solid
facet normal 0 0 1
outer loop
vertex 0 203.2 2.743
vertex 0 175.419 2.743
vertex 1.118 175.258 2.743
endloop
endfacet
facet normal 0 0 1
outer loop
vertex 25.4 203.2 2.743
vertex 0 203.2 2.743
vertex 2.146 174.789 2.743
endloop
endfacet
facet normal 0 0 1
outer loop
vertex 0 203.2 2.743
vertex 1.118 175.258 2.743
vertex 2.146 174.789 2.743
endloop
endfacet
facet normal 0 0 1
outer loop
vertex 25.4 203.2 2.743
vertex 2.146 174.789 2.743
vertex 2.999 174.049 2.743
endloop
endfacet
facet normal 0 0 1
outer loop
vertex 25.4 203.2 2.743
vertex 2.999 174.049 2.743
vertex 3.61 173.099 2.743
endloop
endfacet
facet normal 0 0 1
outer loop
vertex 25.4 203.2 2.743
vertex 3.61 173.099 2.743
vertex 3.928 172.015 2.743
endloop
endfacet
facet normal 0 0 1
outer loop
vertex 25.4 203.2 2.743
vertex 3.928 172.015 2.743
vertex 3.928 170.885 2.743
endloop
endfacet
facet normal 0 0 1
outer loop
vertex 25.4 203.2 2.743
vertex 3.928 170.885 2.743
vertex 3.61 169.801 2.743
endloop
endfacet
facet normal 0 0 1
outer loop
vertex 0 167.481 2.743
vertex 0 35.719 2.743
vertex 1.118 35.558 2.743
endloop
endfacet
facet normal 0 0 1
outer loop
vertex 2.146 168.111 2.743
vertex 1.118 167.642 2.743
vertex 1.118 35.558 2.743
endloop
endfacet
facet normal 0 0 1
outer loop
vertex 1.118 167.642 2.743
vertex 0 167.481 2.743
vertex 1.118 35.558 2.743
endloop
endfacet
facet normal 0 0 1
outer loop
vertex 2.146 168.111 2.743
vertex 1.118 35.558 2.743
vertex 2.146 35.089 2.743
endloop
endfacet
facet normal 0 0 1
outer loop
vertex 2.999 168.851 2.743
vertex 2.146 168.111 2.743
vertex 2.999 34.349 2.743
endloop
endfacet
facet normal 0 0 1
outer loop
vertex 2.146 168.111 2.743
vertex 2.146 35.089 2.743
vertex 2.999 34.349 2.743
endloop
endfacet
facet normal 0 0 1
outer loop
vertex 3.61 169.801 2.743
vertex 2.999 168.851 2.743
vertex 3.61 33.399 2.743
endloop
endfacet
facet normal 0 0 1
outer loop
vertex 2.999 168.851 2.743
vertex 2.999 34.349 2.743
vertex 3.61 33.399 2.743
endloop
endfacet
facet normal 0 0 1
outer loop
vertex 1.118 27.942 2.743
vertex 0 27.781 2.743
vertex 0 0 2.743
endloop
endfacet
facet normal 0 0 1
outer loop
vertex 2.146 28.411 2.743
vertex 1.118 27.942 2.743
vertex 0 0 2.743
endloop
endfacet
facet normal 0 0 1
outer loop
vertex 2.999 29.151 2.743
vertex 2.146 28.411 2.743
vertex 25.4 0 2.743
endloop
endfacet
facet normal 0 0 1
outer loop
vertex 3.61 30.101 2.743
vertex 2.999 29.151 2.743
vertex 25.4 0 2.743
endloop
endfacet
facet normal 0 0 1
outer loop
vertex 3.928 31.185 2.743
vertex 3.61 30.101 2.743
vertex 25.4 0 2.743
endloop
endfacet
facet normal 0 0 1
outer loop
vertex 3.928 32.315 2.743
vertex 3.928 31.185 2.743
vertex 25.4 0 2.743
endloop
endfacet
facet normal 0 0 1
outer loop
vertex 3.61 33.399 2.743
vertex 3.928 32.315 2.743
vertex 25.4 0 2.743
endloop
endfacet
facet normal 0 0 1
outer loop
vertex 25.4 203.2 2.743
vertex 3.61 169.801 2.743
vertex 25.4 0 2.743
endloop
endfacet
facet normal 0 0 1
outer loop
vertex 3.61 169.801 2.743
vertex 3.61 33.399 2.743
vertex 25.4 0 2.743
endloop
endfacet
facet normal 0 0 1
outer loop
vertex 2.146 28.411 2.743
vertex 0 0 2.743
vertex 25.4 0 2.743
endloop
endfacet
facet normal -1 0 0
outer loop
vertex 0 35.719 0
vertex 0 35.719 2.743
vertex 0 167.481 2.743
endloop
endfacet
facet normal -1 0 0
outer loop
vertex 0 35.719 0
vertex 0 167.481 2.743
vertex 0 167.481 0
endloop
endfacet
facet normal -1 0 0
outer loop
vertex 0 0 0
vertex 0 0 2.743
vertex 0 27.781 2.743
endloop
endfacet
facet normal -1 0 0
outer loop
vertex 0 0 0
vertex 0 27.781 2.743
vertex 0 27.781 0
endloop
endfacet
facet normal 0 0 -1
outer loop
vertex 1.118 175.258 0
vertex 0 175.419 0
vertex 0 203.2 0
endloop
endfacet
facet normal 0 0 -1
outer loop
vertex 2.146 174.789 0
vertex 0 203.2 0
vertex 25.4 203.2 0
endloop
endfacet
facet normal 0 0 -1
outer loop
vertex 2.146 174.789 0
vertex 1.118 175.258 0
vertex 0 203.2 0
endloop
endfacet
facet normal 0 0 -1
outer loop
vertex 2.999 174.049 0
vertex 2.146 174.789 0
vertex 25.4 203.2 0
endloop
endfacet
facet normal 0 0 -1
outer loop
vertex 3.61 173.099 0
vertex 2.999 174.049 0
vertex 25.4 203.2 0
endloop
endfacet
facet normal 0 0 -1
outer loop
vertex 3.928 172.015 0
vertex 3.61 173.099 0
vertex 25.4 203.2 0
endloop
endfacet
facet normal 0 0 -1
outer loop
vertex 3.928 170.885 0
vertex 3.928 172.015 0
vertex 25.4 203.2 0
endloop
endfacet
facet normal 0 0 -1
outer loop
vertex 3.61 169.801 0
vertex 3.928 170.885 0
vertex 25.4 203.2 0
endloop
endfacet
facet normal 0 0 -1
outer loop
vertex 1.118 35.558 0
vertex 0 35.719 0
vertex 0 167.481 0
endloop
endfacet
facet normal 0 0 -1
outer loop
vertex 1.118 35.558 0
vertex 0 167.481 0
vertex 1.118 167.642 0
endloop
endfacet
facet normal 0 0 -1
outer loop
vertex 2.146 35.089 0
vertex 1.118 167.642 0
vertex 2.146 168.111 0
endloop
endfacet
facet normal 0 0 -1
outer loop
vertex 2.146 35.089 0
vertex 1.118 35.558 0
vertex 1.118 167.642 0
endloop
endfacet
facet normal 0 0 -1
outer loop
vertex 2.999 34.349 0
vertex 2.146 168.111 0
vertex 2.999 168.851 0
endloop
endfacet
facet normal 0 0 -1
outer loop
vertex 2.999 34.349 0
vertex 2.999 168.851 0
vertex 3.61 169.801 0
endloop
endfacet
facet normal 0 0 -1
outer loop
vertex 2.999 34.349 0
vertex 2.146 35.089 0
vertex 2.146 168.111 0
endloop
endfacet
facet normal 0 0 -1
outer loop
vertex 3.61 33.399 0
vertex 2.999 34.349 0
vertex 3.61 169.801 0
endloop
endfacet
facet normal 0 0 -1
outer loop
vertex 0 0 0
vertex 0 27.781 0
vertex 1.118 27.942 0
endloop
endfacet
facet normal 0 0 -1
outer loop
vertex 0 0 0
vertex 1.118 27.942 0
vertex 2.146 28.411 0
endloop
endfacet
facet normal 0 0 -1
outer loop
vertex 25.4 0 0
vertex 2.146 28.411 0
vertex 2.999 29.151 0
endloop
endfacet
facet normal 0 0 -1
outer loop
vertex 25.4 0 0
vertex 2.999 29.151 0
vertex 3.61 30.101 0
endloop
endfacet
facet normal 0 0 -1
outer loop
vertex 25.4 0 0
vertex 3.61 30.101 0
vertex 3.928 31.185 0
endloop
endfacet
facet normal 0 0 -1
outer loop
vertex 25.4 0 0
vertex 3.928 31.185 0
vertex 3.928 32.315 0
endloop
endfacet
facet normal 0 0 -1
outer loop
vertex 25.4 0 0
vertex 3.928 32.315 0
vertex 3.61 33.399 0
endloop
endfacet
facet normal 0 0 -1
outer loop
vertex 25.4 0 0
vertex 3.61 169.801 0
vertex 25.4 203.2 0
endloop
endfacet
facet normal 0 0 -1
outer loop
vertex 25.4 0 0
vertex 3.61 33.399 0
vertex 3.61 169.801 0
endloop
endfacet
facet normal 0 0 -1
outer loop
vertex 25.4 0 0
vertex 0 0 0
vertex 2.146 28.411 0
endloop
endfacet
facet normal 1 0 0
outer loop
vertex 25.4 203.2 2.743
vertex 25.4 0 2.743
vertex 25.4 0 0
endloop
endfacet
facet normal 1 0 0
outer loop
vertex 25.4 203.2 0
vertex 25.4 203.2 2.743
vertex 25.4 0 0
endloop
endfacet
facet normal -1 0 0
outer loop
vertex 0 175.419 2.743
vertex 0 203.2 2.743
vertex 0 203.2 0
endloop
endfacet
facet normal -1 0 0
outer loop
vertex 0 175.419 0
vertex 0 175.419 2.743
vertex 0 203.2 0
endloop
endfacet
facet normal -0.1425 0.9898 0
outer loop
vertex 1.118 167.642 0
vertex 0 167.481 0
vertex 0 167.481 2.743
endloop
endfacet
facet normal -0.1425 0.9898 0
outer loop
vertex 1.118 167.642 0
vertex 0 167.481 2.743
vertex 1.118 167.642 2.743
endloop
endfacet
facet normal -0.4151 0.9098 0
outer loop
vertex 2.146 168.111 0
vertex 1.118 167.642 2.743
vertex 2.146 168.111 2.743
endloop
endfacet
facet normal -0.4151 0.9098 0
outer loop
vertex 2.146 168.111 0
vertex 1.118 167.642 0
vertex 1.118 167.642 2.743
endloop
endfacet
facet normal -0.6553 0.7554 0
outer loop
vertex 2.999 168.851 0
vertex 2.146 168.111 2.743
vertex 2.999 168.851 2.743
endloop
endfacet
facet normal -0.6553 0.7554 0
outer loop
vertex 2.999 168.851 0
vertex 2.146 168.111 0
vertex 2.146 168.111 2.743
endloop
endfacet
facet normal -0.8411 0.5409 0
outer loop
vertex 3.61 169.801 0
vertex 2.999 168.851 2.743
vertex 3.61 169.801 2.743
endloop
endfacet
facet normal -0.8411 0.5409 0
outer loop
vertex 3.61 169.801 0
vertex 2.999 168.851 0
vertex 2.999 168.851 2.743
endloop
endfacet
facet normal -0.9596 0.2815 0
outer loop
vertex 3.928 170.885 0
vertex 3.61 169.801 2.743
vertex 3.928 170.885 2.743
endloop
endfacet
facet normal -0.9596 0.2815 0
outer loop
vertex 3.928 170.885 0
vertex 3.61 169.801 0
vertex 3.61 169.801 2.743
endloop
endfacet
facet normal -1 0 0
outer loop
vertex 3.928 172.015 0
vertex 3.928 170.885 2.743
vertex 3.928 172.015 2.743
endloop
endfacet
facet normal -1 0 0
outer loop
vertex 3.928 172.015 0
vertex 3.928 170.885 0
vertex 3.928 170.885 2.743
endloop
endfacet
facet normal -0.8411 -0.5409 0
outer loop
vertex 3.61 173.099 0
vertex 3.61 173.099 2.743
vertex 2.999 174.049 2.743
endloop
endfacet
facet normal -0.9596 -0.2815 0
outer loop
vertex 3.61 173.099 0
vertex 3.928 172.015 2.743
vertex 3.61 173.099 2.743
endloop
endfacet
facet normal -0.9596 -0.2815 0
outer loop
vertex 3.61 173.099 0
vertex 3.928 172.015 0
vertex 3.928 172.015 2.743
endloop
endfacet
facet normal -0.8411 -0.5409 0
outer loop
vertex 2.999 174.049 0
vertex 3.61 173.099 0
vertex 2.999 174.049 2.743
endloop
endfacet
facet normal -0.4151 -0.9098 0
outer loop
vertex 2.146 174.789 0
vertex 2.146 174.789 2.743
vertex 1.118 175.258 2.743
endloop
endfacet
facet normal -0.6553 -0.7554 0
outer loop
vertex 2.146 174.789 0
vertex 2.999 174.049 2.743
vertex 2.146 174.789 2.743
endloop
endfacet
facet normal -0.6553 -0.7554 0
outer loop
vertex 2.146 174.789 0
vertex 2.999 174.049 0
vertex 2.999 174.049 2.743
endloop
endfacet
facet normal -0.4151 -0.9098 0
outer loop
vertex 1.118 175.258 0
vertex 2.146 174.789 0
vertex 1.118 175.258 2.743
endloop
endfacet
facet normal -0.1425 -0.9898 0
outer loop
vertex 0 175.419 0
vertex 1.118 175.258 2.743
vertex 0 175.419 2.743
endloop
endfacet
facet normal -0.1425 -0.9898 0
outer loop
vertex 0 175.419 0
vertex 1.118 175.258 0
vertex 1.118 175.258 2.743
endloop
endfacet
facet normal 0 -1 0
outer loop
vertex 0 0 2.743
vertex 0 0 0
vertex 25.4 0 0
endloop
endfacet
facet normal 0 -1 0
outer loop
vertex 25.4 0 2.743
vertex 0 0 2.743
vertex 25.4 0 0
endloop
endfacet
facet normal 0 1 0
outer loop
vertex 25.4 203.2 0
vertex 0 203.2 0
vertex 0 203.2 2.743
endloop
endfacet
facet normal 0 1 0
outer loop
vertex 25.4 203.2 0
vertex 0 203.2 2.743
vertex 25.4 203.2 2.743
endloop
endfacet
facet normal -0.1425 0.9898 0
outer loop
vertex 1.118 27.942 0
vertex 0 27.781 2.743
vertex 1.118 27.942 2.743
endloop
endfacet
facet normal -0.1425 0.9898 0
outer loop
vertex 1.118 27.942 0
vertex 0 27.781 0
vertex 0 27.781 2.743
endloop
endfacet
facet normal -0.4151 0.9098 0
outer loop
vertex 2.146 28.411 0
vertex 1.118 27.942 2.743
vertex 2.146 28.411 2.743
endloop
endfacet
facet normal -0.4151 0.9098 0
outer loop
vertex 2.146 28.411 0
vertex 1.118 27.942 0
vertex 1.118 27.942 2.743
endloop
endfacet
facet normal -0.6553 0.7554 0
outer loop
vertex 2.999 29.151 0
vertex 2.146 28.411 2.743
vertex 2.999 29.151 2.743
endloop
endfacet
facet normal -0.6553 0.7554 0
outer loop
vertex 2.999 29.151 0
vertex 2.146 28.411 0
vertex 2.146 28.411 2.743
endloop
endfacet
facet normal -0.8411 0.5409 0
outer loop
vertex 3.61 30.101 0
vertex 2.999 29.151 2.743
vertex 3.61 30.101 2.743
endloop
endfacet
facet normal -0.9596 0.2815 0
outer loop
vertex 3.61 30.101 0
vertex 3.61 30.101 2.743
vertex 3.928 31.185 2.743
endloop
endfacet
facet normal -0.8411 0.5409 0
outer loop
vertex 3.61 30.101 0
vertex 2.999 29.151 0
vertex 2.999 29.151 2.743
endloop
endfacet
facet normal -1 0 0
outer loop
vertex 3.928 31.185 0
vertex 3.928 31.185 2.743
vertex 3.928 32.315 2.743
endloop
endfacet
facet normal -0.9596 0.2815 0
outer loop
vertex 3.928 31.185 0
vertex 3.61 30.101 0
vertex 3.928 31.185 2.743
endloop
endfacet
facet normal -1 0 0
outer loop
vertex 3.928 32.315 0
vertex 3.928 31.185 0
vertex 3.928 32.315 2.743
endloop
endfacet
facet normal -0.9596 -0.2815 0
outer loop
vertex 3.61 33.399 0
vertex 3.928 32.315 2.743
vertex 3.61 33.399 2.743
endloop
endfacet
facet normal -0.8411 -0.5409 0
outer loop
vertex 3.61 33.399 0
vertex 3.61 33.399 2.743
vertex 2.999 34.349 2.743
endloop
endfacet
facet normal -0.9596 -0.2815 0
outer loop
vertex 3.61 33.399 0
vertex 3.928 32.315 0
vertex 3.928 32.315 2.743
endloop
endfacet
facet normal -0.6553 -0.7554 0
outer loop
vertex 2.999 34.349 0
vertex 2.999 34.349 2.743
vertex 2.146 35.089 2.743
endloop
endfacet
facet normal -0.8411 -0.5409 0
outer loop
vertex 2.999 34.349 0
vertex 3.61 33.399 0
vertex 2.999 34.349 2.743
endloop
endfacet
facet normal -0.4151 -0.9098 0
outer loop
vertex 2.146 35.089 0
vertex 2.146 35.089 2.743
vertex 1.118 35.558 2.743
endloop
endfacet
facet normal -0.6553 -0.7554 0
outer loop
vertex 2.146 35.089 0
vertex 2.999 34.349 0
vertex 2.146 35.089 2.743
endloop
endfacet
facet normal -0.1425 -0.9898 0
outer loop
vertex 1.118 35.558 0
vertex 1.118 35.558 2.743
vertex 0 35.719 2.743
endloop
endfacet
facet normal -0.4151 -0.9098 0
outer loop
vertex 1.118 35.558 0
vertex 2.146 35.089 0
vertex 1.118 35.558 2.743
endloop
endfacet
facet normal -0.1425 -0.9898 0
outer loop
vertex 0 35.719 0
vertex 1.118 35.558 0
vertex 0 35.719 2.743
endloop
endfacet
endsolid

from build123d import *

# Parameters (mm, degrees)
SKETCH1_W               = 25.4
SKETCH1_H               = 2.7432
BOSS_EXTRUDE1_DEPTH     = 203.2
CUT_EXTRUDE1_DEPTH      = 111.720339735
CUT_EXTRUDE1_DEPTH_BACK = 111.720339735
SKETCH2_R               = 3.96875


with BuildPart() as part:
    # Sketch1 → Boss-Extrude1 (new body)
    with BuildSketch(Plane(origin=(0, 0, 0), x_dir=(1, 0, 0), z_dir=(0, 1, 0))):
        with Locations((12.7, -1.3716)):
            Rectangle(SKETCH1_W, SKETCH1_H)
    extrude(amount=BOSS_EXTRUDE1_DEPTH)

    # Sketch2 → Cut-Extrude1 (cut, two sides: drawn at the far end of the back side and taken through both)
    with BuildSketch(Plane(origin=(-3.908296933, 106.606717755, 5.9182), x_dir=(1, 0, 0), z_dir=(0, 0, 1)).offset(-CUT_EXTRUDE1_DEPTH_BACK)):
        with Locations((3.908296933, 64.843282245)):
            Circle(SKETCH2_R)
        with Locations((3.908296933, -74.856717755)):
            Circle(SKETCH2_R)
    extrude(amount=CUT_EXTRUDE1_DEPTH + CUT_EXTRUDE1_DEPTH_BACK, mode=Mode.SUBTRACT)


solid = part.part
